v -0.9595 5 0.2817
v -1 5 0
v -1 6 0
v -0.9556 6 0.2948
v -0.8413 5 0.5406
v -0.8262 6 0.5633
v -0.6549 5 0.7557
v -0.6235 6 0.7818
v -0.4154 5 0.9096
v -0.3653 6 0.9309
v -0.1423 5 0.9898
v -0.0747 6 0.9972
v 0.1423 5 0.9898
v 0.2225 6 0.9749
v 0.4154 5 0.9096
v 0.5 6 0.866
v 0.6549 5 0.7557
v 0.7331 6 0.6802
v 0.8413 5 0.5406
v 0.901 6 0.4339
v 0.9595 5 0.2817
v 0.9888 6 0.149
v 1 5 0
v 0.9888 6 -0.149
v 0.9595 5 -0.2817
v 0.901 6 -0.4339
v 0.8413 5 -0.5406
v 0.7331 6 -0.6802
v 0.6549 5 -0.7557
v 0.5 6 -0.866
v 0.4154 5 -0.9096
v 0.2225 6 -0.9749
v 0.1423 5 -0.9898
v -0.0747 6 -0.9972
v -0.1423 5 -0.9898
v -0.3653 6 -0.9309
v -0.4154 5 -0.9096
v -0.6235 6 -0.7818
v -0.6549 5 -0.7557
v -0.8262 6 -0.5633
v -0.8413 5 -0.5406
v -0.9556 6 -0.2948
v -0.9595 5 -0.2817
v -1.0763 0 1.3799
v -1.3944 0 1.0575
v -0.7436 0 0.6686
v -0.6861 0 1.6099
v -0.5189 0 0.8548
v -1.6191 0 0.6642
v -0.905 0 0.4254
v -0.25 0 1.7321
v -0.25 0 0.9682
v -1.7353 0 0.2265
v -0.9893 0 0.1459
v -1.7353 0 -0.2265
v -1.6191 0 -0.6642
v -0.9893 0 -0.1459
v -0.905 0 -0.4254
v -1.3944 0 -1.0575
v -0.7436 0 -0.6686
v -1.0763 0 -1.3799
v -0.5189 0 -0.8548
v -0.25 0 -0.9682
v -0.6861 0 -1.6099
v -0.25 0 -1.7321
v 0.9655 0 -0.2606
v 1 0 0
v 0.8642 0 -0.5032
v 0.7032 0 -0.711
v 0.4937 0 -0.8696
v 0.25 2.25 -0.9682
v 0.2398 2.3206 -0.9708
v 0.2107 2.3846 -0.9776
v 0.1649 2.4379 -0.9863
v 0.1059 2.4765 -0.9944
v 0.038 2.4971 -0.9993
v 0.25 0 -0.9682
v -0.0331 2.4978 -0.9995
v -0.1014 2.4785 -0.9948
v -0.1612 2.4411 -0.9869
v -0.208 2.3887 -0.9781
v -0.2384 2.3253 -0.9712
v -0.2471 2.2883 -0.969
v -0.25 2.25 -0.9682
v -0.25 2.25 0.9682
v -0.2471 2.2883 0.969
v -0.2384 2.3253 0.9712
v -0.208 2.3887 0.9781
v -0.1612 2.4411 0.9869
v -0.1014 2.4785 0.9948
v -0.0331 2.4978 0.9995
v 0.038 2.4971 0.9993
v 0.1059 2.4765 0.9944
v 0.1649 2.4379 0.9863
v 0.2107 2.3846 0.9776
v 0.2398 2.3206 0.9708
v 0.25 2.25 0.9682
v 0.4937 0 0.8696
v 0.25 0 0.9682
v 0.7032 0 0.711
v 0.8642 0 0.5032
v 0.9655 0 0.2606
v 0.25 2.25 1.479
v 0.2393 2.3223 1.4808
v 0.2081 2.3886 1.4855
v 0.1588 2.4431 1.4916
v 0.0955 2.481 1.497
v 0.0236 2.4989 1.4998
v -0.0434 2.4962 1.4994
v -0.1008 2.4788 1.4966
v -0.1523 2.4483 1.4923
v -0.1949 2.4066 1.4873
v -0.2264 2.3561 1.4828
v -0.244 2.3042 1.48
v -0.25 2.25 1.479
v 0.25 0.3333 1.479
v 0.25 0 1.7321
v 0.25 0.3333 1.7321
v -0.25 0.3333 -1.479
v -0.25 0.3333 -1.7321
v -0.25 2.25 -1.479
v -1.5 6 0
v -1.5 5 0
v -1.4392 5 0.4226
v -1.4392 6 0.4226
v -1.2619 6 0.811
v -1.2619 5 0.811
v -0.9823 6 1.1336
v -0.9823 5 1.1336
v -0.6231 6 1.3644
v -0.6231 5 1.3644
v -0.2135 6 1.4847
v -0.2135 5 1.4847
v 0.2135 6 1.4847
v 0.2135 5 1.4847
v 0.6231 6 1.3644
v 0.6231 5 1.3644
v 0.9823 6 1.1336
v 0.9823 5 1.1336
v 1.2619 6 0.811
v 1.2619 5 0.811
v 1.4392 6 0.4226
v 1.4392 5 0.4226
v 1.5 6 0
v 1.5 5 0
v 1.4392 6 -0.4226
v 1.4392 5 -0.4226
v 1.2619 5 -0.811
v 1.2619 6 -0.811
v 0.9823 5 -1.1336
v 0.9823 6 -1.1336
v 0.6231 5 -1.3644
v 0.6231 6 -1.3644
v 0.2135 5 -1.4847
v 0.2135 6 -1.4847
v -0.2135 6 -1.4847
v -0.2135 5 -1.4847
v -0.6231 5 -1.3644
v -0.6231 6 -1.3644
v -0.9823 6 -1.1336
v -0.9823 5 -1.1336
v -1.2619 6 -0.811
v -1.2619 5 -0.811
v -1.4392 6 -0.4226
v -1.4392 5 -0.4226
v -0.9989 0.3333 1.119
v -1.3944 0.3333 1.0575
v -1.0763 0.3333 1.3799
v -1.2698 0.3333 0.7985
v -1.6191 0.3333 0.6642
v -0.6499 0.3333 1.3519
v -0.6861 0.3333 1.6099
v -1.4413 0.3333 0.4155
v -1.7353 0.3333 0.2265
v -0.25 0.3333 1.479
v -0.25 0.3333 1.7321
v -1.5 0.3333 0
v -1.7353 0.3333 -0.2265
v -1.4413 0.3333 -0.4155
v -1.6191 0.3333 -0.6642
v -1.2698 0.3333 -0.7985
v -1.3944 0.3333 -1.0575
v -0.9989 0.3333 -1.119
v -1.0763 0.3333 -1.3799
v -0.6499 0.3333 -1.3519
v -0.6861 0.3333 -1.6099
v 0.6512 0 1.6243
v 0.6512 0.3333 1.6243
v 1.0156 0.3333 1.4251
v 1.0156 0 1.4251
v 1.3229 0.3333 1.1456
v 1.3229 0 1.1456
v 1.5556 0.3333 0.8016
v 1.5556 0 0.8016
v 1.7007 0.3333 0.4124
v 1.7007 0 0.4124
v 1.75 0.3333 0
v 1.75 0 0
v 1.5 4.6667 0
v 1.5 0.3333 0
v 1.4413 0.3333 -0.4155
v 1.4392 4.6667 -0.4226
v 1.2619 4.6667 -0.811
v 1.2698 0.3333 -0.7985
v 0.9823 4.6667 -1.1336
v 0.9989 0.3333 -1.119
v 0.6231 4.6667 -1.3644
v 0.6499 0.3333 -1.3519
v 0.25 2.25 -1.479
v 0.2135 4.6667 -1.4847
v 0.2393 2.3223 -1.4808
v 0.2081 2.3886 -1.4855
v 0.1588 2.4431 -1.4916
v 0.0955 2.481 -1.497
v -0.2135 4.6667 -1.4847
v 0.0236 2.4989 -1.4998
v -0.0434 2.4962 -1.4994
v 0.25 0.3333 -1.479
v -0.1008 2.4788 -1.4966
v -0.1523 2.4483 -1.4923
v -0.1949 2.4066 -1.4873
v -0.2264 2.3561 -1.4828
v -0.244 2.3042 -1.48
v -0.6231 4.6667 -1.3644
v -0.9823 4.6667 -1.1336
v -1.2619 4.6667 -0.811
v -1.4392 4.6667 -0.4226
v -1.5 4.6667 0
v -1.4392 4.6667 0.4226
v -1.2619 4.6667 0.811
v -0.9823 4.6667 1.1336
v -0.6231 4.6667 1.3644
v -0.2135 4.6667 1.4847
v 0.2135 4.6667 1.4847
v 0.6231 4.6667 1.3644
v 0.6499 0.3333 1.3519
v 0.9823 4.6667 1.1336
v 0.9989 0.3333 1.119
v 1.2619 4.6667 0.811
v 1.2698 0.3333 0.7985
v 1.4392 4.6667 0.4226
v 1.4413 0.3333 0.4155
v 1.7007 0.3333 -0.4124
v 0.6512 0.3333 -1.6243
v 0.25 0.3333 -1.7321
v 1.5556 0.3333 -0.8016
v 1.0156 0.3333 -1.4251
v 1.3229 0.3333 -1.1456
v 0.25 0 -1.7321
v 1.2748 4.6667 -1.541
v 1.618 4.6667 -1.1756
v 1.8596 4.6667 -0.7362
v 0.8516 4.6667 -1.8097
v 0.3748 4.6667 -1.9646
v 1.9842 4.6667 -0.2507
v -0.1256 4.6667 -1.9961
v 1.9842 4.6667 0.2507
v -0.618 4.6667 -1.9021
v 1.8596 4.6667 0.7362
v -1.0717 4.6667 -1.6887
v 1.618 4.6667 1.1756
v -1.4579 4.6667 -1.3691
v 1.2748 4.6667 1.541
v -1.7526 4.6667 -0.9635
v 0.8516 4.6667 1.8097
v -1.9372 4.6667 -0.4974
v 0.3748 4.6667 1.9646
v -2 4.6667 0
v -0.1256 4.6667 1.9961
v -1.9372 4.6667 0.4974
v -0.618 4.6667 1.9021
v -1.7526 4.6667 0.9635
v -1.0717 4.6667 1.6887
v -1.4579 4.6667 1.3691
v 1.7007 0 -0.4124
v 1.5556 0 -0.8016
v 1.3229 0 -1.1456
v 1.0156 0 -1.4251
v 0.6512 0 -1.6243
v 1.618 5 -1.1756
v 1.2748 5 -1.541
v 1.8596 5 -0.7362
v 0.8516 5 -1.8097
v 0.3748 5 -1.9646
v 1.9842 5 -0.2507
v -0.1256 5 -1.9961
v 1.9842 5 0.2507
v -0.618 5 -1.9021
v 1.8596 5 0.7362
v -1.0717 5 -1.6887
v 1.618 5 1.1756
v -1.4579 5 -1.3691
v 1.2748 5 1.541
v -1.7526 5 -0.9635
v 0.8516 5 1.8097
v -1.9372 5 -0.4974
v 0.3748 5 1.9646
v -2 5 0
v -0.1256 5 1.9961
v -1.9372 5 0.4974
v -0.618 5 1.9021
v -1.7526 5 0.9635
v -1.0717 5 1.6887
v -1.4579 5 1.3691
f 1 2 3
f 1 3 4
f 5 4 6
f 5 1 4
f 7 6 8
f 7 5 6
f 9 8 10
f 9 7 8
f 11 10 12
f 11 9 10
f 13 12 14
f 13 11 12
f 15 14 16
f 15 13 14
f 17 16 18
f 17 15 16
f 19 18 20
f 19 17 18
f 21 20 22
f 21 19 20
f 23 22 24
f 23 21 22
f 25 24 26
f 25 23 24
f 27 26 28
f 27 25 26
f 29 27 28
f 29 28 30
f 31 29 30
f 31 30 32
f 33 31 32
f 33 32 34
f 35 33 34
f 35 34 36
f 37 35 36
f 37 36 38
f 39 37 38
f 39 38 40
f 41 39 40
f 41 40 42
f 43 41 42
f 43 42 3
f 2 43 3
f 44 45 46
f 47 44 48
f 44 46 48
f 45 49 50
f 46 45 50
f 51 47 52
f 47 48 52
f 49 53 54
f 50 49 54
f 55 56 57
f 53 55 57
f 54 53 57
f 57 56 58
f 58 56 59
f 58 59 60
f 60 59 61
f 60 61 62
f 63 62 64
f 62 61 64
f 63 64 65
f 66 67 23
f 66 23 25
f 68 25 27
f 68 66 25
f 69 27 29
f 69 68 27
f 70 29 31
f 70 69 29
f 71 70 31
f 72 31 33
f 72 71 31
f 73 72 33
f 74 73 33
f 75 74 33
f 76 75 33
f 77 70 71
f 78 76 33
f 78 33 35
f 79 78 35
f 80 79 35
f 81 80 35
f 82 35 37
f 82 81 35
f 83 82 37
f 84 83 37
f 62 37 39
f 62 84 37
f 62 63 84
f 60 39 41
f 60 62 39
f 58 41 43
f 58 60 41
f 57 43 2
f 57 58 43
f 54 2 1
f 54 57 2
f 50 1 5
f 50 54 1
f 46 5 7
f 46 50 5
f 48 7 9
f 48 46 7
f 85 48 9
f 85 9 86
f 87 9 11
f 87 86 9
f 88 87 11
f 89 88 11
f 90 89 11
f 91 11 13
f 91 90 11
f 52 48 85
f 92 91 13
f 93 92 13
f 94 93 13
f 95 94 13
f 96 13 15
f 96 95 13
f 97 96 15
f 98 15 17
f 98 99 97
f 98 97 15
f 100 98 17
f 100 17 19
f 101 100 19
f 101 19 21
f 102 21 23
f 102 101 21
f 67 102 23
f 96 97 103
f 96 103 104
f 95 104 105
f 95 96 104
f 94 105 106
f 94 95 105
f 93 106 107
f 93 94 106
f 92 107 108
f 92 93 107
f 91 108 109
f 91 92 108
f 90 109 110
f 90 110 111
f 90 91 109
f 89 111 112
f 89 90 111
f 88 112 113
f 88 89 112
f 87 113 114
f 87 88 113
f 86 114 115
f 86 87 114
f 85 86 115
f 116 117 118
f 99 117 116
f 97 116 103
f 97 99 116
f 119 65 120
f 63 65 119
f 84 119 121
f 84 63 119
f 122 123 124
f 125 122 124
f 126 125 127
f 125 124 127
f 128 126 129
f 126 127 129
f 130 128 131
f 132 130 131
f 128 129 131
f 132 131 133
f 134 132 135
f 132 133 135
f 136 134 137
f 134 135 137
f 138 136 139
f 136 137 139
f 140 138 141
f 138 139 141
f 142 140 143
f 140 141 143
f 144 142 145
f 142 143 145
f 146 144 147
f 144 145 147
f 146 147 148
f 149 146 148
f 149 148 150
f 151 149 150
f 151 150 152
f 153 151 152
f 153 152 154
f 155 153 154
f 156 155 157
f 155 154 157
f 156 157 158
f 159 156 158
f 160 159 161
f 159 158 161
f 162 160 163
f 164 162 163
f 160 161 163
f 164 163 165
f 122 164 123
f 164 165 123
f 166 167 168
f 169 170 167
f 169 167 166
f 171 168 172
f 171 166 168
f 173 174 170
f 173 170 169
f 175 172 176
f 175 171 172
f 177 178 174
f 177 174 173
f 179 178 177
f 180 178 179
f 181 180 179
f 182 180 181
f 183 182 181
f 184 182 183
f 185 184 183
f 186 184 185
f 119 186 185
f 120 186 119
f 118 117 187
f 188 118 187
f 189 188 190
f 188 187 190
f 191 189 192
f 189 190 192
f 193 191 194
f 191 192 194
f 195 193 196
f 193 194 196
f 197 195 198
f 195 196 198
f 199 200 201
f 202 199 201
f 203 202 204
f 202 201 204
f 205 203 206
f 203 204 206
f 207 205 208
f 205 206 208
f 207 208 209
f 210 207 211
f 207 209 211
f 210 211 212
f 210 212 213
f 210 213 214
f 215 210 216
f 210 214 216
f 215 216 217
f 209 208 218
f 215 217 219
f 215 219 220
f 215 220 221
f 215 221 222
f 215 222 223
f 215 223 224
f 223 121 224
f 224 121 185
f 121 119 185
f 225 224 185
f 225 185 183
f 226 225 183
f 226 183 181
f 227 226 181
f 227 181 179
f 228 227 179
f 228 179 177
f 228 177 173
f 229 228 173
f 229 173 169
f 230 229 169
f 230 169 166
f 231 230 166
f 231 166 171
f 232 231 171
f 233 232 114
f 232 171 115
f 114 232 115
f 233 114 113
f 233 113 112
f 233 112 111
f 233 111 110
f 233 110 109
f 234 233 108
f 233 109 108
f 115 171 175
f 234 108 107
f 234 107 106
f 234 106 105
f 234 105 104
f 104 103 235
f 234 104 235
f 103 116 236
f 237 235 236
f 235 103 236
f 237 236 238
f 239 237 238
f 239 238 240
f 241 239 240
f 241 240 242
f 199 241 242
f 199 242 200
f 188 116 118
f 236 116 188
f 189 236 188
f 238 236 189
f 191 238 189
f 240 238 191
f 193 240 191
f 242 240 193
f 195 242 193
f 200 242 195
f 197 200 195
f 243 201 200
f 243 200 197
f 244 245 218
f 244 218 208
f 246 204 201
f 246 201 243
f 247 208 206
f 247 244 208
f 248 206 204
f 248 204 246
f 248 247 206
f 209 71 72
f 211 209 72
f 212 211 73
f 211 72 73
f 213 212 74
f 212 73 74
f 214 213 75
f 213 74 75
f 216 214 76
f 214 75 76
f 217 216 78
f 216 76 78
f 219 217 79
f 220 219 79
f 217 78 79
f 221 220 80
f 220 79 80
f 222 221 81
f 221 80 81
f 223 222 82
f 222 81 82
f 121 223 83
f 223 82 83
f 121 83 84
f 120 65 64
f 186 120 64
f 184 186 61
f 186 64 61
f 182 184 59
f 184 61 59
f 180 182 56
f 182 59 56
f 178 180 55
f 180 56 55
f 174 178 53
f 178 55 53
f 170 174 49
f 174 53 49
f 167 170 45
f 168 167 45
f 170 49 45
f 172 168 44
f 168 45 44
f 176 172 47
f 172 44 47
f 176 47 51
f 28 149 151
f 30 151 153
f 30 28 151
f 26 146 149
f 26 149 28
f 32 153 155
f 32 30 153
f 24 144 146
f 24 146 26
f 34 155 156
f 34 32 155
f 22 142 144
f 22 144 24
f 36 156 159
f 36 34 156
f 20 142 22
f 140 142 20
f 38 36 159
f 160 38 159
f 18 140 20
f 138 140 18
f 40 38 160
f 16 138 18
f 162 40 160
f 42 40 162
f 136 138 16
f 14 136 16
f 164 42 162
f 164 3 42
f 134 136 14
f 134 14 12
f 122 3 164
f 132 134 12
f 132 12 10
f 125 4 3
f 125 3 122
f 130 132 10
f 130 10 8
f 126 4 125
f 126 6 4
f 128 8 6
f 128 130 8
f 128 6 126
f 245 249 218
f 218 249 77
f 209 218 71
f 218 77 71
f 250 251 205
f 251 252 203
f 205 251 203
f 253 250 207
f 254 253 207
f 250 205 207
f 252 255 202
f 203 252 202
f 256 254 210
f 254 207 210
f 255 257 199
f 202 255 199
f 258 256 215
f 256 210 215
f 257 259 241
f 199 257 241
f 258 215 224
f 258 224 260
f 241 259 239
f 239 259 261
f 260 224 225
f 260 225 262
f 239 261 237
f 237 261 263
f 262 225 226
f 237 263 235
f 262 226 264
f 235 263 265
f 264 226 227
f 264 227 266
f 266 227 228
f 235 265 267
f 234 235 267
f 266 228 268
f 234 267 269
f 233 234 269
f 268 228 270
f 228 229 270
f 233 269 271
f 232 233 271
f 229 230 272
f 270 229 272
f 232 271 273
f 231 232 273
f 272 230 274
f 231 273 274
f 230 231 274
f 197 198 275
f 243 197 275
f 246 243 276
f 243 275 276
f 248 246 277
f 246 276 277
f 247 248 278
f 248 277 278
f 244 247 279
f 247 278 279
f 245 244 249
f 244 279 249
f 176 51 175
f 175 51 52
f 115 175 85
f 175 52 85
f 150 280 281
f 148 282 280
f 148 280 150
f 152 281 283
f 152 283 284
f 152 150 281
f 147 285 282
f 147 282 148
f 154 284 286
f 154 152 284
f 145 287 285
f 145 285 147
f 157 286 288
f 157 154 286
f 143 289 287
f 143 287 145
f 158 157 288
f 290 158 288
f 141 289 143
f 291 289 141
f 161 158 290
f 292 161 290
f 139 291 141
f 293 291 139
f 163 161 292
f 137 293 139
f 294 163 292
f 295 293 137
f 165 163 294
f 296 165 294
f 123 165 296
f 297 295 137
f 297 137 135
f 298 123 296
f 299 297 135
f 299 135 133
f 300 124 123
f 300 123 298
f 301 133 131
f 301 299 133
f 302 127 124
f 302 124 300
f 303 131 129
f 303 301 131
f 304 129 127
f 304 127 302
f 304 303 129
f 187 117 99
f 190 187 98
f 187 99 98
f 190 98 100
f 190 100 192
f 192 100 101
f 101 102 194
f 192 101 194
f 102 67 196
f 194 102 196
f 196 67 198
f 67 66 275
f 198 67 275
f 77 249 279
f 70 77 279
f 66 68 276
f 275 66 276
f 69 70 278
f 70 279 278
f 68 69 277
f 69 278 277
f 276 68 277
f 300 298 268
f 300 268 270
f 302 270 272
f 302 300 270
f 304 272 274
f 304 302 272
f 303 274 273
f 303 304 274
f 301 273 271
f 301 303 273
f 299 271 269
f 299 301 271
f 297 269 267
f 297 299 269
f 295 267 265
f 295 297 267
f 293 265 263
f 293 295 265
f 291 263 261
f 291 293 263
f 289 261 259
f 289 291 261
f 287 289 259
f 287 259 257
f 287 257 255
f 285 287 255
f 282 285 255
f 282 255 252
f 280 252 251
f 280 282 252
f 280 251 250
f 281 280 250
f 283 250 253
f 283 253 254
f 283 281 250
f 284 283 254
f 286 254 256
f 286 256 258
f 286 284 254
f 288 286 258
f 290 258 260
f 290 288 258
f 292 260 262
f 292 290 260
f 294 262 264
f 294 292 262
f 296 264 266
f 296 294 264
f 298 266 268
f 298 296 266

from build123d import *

# Parameters (mm, degrees)
SKETCH2_R               = 1.5
SKETCH2_R_2             = 1
BOSS_EXTRUDE2_DEPTH     = 5
SKETCH2_3_R             = 1.75
SKETCH2_3_R_2           = 1.5
BOSS_EXTRUDE3_DEPTH     = 0.333333333
SKETCH3_R               = 2
SKETCH3_R_2             = 1.5
BOSS_EXTRUDE4_DEPTH     = 0.333333333
SKETCH3_3_R             = 1.5
SKETCH3_3_R_2           = 1
BOSS_EXTRUDE5_DEPTH     = 1
SKETCH5_R               = 0.25
SKETCH5_W               = 0.5
SKETCH5_H               = 2.25
CUT_EXTRUDE1_DEPTH      = 2
CUT_EXTRUDE1_DEPTH_BACK = 2


with BuildPart() as part:
    # Sketch2 → Boss-Extrude2 (new body)
    with BuildSketch(Plane(origin=(0, 0, 0), x_dir=(1, 0, 0), z_dir=(0, 1, 0))):
        Circle(SKETCH2_R)
        Circle(SKETCH2_R_2, mode=Mode.SUBTRACT)
    extrude(amount=BOSS_EXTRUDE2_DEPTH)

    # Sketch2_3 → Boss-Extrude3 (add)
    with BuildSketch(Plane(origin=(0, 0, 0), x_dir=(1, 0, 0), z_dir=(0, 1, 0))):
        Circle(SKETCH2_3_R)
        Circle(SKETCH2_3_R_2, mode=Mode.SUBTRACT)
    extrude(amount=BOSS_EXTRUDE3_DEPTH)

    # Sketch3 → Boss-Extrude4 (add)
    with BuildSketch(Plane(origin=(0, 5, 0), x_dir=(-1, 0, 0), z_dir=(0, 1, 0))):
        Circle(SKETCH3_R)
        Circle(SKETCH3_R_2, mode=Mode.SUBTRACT)
    extrude(amount=-BOSS_EXTRUDE4_DEPTH)

    # Sketch3_3 → Boss-Extrude5 (add)
    with BuildSketch(Plane(origin=(0, 5, 0), x_dir=(-1, 0, 0), z_dir=(0, 1, 0))):
        Circle(SKETCH3_3_R)
        Circle(SKETCH3_3_R_2, mode=Mode.SUBTRACT)
    extrude(amount=BOSS_EXTRUDE5_DEPTH)

    # Sketch5 → Cut-Extrude1 (cut, two sides)
    with BuildSketch(Plane.XY) as cut_extrude1_sk:
        with Locations((0, 2.25)):
            Circle(SKETCH5_R)
        with Locations((0, 1.125)):
            Rectangle(SKETCH5_W, SKETCH5_H)
    extrude(amount=CUT_EXTRUDE1_DEPTH, mode=Mode.SUBTRACT)
    extrude(cut_extrude1_sk.sketch, amount=-CUT_EXTRUDE1_DEPTH_BACK, mode=Mode.SUBTRACT)


solid = part.part
